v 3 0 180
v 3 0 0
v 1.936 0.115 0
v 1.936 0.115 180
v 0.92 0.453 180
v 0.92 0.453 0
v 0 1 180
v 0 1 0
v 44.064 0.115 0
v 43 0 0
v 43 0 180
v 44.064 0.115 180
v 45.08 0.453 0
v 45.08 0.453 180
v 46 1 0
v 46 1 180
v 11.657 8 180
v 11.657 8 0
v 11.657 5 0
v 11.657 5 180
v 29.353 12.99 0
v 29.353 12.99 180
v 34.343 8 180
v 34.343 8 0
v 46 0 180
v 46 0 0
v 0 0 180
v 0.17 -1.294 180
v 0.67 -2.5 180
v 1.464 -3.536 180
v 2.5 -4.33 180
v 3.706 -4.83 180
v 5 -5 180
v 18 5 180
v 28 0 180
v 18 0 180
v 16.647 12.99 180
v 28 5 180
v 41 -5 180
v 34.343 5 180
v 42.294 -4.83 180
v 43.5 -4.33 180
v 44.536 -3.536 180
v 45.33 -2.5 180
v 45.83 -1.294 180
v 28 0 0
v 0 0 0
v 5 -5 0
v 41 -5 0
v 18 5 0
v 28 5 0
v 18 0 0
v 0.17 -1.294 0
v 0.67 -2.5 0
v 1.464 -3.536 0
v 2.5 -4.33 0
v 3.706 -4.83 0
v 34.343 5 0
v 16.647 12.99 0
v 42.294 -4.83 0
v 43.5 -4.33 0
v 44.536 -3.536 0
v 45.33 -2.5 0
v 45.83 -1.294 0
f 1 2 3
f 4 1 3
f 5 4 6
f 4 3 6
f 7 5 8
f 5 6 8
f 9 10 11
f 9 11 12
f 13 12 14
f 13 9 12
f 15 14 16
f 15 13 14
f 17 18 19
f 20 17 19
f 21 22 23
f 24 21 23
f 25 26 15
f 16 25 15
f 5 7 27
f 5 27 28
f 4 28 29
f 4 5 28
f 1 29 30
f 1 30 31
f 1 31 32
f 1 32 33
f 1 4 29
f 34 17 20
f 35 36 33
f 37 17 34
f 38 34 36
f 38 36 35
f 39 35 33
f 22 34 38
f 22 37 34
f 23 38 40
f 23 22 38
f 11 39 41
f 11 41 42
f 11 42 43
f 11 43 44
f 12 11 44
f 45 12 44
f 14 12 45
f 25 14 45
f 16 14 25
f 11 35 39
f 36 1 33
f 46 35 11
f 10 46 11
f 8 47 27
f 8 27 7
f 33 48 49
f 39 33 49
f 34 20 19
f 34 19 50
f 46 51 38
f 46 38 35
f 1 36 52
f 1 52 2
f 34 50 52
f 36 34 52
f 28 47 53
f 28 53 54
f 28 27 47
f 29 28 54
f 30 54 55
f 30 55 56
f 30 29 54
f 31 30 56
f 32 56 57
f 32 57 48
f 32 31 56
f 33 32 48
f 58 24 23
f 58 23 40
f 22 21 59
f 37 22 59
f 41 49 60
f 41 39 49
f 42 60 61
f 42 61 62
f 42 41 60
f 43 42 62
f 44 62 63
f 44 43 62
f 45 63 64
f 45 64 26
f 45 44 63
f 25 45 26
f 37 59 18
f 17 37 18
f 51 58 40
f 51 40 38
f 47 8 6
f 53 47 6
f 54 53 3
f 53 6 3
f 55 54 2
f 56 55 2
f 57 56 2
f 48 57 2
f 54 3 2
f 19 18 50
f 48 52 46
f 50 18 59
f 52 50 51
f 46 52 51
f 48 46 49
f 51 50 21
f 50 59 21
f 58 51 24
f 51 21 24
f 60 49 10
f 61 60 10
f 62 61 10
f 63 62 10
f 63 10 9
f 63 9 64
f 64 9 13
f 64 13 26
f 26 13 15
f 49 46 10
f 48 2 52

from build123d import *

# Parameters (mm, degrees)
PAD_DEPTH              = 180
FUSION_PLACEMENT_ANGLE = 90
BOX_W                  = 46
BOX_H                  = 18
BOX_DEPTH              = 180
FILLET_R               = 5


with BuildPart() as pad:
    # Sketch → Pad (new body)
    with BuildSketch(Plane.XY):
        with BuildLine():
            Line((-4.01, 0), (-12.01, 0))
            Line((-12.01, 0), (-12.01, -6.353146))
            Line((-12.01, -6.353146), (-17, -11.343146))
            Line((-17, -11.343146), (-20, -11.343146))
            Line((-20, -11.343146), (-20, -5))
            Line((-20, -5), (-25, -5))
            Line((-25, -5), (-25, -20))
            ThreePointArc((-25, -20), (-23.535534, -23.535534), (-20, -25))
            Line((-20, -25), (-5, -25))
            Line((-5, -25), (-5, -20))
            Line((-5, -20), (-11.343146, -20))
            Line((-11.343146, -20), (-11.343146, -17))
            Line((-11.343146, -17), (-6.353146, -12.01))
            Line((-6.353146, -12.01), (0, -12.01))
            Line((0, -12.01), (0, -4.01))
            ThreePointArc((-4.01, 0), (-2.835498, -2.835498), (0, -4.01))
        make_face()
    extrude(amount=PAD_DEPTH)


with BuildPart() as part_mirroring:
    # Part__Mirroring: instance of Pad
    add(pad.part.mirror(Plane(origin=(0, 0, 0), x_dir=(1, 0, 0), z_dir=(0, 1, 0))))


with BuildPart() as fusion:
    # Fusion base: copy of Pad
    add(pad.part)

    # Fusion: union Part__Mirroring
    add(part_mirroring.part)


with BuildPart() as fusion_1:
    # Fusion placement: moved
    add(fusion.part.moved(Location((23, 25, 0))).rotate(Axis((23, 25, 0), (0, 0, 1)), FUSION_PLACEMENT_ANGLE))


with BuildPart() as fillet_body:
    # Box → Box (new body)
    with BuildSketch(Plane(origin=(0, -5, 0), x_dir=(1, 0, 0), z_dir=(0, 0, 1))):
        with Locations((23, 9)):
            Rectangle(BOX_W, BOX_H)
    extrude(amount=BOX_DEPTH)

    # Cut: cut Fusion
    add(fusion_1.part, mode=Mode.SUBTRACT)

    # Fillet
    fillet_edges = [fillet_body.edges().sort_by_distance(p)[0] for p in [
        (0, -5, 90),
        (46, -5, 90),
    ]]
    fillet(fillet_edges, radius=FILLET_R)


solid = fillet_body.part
